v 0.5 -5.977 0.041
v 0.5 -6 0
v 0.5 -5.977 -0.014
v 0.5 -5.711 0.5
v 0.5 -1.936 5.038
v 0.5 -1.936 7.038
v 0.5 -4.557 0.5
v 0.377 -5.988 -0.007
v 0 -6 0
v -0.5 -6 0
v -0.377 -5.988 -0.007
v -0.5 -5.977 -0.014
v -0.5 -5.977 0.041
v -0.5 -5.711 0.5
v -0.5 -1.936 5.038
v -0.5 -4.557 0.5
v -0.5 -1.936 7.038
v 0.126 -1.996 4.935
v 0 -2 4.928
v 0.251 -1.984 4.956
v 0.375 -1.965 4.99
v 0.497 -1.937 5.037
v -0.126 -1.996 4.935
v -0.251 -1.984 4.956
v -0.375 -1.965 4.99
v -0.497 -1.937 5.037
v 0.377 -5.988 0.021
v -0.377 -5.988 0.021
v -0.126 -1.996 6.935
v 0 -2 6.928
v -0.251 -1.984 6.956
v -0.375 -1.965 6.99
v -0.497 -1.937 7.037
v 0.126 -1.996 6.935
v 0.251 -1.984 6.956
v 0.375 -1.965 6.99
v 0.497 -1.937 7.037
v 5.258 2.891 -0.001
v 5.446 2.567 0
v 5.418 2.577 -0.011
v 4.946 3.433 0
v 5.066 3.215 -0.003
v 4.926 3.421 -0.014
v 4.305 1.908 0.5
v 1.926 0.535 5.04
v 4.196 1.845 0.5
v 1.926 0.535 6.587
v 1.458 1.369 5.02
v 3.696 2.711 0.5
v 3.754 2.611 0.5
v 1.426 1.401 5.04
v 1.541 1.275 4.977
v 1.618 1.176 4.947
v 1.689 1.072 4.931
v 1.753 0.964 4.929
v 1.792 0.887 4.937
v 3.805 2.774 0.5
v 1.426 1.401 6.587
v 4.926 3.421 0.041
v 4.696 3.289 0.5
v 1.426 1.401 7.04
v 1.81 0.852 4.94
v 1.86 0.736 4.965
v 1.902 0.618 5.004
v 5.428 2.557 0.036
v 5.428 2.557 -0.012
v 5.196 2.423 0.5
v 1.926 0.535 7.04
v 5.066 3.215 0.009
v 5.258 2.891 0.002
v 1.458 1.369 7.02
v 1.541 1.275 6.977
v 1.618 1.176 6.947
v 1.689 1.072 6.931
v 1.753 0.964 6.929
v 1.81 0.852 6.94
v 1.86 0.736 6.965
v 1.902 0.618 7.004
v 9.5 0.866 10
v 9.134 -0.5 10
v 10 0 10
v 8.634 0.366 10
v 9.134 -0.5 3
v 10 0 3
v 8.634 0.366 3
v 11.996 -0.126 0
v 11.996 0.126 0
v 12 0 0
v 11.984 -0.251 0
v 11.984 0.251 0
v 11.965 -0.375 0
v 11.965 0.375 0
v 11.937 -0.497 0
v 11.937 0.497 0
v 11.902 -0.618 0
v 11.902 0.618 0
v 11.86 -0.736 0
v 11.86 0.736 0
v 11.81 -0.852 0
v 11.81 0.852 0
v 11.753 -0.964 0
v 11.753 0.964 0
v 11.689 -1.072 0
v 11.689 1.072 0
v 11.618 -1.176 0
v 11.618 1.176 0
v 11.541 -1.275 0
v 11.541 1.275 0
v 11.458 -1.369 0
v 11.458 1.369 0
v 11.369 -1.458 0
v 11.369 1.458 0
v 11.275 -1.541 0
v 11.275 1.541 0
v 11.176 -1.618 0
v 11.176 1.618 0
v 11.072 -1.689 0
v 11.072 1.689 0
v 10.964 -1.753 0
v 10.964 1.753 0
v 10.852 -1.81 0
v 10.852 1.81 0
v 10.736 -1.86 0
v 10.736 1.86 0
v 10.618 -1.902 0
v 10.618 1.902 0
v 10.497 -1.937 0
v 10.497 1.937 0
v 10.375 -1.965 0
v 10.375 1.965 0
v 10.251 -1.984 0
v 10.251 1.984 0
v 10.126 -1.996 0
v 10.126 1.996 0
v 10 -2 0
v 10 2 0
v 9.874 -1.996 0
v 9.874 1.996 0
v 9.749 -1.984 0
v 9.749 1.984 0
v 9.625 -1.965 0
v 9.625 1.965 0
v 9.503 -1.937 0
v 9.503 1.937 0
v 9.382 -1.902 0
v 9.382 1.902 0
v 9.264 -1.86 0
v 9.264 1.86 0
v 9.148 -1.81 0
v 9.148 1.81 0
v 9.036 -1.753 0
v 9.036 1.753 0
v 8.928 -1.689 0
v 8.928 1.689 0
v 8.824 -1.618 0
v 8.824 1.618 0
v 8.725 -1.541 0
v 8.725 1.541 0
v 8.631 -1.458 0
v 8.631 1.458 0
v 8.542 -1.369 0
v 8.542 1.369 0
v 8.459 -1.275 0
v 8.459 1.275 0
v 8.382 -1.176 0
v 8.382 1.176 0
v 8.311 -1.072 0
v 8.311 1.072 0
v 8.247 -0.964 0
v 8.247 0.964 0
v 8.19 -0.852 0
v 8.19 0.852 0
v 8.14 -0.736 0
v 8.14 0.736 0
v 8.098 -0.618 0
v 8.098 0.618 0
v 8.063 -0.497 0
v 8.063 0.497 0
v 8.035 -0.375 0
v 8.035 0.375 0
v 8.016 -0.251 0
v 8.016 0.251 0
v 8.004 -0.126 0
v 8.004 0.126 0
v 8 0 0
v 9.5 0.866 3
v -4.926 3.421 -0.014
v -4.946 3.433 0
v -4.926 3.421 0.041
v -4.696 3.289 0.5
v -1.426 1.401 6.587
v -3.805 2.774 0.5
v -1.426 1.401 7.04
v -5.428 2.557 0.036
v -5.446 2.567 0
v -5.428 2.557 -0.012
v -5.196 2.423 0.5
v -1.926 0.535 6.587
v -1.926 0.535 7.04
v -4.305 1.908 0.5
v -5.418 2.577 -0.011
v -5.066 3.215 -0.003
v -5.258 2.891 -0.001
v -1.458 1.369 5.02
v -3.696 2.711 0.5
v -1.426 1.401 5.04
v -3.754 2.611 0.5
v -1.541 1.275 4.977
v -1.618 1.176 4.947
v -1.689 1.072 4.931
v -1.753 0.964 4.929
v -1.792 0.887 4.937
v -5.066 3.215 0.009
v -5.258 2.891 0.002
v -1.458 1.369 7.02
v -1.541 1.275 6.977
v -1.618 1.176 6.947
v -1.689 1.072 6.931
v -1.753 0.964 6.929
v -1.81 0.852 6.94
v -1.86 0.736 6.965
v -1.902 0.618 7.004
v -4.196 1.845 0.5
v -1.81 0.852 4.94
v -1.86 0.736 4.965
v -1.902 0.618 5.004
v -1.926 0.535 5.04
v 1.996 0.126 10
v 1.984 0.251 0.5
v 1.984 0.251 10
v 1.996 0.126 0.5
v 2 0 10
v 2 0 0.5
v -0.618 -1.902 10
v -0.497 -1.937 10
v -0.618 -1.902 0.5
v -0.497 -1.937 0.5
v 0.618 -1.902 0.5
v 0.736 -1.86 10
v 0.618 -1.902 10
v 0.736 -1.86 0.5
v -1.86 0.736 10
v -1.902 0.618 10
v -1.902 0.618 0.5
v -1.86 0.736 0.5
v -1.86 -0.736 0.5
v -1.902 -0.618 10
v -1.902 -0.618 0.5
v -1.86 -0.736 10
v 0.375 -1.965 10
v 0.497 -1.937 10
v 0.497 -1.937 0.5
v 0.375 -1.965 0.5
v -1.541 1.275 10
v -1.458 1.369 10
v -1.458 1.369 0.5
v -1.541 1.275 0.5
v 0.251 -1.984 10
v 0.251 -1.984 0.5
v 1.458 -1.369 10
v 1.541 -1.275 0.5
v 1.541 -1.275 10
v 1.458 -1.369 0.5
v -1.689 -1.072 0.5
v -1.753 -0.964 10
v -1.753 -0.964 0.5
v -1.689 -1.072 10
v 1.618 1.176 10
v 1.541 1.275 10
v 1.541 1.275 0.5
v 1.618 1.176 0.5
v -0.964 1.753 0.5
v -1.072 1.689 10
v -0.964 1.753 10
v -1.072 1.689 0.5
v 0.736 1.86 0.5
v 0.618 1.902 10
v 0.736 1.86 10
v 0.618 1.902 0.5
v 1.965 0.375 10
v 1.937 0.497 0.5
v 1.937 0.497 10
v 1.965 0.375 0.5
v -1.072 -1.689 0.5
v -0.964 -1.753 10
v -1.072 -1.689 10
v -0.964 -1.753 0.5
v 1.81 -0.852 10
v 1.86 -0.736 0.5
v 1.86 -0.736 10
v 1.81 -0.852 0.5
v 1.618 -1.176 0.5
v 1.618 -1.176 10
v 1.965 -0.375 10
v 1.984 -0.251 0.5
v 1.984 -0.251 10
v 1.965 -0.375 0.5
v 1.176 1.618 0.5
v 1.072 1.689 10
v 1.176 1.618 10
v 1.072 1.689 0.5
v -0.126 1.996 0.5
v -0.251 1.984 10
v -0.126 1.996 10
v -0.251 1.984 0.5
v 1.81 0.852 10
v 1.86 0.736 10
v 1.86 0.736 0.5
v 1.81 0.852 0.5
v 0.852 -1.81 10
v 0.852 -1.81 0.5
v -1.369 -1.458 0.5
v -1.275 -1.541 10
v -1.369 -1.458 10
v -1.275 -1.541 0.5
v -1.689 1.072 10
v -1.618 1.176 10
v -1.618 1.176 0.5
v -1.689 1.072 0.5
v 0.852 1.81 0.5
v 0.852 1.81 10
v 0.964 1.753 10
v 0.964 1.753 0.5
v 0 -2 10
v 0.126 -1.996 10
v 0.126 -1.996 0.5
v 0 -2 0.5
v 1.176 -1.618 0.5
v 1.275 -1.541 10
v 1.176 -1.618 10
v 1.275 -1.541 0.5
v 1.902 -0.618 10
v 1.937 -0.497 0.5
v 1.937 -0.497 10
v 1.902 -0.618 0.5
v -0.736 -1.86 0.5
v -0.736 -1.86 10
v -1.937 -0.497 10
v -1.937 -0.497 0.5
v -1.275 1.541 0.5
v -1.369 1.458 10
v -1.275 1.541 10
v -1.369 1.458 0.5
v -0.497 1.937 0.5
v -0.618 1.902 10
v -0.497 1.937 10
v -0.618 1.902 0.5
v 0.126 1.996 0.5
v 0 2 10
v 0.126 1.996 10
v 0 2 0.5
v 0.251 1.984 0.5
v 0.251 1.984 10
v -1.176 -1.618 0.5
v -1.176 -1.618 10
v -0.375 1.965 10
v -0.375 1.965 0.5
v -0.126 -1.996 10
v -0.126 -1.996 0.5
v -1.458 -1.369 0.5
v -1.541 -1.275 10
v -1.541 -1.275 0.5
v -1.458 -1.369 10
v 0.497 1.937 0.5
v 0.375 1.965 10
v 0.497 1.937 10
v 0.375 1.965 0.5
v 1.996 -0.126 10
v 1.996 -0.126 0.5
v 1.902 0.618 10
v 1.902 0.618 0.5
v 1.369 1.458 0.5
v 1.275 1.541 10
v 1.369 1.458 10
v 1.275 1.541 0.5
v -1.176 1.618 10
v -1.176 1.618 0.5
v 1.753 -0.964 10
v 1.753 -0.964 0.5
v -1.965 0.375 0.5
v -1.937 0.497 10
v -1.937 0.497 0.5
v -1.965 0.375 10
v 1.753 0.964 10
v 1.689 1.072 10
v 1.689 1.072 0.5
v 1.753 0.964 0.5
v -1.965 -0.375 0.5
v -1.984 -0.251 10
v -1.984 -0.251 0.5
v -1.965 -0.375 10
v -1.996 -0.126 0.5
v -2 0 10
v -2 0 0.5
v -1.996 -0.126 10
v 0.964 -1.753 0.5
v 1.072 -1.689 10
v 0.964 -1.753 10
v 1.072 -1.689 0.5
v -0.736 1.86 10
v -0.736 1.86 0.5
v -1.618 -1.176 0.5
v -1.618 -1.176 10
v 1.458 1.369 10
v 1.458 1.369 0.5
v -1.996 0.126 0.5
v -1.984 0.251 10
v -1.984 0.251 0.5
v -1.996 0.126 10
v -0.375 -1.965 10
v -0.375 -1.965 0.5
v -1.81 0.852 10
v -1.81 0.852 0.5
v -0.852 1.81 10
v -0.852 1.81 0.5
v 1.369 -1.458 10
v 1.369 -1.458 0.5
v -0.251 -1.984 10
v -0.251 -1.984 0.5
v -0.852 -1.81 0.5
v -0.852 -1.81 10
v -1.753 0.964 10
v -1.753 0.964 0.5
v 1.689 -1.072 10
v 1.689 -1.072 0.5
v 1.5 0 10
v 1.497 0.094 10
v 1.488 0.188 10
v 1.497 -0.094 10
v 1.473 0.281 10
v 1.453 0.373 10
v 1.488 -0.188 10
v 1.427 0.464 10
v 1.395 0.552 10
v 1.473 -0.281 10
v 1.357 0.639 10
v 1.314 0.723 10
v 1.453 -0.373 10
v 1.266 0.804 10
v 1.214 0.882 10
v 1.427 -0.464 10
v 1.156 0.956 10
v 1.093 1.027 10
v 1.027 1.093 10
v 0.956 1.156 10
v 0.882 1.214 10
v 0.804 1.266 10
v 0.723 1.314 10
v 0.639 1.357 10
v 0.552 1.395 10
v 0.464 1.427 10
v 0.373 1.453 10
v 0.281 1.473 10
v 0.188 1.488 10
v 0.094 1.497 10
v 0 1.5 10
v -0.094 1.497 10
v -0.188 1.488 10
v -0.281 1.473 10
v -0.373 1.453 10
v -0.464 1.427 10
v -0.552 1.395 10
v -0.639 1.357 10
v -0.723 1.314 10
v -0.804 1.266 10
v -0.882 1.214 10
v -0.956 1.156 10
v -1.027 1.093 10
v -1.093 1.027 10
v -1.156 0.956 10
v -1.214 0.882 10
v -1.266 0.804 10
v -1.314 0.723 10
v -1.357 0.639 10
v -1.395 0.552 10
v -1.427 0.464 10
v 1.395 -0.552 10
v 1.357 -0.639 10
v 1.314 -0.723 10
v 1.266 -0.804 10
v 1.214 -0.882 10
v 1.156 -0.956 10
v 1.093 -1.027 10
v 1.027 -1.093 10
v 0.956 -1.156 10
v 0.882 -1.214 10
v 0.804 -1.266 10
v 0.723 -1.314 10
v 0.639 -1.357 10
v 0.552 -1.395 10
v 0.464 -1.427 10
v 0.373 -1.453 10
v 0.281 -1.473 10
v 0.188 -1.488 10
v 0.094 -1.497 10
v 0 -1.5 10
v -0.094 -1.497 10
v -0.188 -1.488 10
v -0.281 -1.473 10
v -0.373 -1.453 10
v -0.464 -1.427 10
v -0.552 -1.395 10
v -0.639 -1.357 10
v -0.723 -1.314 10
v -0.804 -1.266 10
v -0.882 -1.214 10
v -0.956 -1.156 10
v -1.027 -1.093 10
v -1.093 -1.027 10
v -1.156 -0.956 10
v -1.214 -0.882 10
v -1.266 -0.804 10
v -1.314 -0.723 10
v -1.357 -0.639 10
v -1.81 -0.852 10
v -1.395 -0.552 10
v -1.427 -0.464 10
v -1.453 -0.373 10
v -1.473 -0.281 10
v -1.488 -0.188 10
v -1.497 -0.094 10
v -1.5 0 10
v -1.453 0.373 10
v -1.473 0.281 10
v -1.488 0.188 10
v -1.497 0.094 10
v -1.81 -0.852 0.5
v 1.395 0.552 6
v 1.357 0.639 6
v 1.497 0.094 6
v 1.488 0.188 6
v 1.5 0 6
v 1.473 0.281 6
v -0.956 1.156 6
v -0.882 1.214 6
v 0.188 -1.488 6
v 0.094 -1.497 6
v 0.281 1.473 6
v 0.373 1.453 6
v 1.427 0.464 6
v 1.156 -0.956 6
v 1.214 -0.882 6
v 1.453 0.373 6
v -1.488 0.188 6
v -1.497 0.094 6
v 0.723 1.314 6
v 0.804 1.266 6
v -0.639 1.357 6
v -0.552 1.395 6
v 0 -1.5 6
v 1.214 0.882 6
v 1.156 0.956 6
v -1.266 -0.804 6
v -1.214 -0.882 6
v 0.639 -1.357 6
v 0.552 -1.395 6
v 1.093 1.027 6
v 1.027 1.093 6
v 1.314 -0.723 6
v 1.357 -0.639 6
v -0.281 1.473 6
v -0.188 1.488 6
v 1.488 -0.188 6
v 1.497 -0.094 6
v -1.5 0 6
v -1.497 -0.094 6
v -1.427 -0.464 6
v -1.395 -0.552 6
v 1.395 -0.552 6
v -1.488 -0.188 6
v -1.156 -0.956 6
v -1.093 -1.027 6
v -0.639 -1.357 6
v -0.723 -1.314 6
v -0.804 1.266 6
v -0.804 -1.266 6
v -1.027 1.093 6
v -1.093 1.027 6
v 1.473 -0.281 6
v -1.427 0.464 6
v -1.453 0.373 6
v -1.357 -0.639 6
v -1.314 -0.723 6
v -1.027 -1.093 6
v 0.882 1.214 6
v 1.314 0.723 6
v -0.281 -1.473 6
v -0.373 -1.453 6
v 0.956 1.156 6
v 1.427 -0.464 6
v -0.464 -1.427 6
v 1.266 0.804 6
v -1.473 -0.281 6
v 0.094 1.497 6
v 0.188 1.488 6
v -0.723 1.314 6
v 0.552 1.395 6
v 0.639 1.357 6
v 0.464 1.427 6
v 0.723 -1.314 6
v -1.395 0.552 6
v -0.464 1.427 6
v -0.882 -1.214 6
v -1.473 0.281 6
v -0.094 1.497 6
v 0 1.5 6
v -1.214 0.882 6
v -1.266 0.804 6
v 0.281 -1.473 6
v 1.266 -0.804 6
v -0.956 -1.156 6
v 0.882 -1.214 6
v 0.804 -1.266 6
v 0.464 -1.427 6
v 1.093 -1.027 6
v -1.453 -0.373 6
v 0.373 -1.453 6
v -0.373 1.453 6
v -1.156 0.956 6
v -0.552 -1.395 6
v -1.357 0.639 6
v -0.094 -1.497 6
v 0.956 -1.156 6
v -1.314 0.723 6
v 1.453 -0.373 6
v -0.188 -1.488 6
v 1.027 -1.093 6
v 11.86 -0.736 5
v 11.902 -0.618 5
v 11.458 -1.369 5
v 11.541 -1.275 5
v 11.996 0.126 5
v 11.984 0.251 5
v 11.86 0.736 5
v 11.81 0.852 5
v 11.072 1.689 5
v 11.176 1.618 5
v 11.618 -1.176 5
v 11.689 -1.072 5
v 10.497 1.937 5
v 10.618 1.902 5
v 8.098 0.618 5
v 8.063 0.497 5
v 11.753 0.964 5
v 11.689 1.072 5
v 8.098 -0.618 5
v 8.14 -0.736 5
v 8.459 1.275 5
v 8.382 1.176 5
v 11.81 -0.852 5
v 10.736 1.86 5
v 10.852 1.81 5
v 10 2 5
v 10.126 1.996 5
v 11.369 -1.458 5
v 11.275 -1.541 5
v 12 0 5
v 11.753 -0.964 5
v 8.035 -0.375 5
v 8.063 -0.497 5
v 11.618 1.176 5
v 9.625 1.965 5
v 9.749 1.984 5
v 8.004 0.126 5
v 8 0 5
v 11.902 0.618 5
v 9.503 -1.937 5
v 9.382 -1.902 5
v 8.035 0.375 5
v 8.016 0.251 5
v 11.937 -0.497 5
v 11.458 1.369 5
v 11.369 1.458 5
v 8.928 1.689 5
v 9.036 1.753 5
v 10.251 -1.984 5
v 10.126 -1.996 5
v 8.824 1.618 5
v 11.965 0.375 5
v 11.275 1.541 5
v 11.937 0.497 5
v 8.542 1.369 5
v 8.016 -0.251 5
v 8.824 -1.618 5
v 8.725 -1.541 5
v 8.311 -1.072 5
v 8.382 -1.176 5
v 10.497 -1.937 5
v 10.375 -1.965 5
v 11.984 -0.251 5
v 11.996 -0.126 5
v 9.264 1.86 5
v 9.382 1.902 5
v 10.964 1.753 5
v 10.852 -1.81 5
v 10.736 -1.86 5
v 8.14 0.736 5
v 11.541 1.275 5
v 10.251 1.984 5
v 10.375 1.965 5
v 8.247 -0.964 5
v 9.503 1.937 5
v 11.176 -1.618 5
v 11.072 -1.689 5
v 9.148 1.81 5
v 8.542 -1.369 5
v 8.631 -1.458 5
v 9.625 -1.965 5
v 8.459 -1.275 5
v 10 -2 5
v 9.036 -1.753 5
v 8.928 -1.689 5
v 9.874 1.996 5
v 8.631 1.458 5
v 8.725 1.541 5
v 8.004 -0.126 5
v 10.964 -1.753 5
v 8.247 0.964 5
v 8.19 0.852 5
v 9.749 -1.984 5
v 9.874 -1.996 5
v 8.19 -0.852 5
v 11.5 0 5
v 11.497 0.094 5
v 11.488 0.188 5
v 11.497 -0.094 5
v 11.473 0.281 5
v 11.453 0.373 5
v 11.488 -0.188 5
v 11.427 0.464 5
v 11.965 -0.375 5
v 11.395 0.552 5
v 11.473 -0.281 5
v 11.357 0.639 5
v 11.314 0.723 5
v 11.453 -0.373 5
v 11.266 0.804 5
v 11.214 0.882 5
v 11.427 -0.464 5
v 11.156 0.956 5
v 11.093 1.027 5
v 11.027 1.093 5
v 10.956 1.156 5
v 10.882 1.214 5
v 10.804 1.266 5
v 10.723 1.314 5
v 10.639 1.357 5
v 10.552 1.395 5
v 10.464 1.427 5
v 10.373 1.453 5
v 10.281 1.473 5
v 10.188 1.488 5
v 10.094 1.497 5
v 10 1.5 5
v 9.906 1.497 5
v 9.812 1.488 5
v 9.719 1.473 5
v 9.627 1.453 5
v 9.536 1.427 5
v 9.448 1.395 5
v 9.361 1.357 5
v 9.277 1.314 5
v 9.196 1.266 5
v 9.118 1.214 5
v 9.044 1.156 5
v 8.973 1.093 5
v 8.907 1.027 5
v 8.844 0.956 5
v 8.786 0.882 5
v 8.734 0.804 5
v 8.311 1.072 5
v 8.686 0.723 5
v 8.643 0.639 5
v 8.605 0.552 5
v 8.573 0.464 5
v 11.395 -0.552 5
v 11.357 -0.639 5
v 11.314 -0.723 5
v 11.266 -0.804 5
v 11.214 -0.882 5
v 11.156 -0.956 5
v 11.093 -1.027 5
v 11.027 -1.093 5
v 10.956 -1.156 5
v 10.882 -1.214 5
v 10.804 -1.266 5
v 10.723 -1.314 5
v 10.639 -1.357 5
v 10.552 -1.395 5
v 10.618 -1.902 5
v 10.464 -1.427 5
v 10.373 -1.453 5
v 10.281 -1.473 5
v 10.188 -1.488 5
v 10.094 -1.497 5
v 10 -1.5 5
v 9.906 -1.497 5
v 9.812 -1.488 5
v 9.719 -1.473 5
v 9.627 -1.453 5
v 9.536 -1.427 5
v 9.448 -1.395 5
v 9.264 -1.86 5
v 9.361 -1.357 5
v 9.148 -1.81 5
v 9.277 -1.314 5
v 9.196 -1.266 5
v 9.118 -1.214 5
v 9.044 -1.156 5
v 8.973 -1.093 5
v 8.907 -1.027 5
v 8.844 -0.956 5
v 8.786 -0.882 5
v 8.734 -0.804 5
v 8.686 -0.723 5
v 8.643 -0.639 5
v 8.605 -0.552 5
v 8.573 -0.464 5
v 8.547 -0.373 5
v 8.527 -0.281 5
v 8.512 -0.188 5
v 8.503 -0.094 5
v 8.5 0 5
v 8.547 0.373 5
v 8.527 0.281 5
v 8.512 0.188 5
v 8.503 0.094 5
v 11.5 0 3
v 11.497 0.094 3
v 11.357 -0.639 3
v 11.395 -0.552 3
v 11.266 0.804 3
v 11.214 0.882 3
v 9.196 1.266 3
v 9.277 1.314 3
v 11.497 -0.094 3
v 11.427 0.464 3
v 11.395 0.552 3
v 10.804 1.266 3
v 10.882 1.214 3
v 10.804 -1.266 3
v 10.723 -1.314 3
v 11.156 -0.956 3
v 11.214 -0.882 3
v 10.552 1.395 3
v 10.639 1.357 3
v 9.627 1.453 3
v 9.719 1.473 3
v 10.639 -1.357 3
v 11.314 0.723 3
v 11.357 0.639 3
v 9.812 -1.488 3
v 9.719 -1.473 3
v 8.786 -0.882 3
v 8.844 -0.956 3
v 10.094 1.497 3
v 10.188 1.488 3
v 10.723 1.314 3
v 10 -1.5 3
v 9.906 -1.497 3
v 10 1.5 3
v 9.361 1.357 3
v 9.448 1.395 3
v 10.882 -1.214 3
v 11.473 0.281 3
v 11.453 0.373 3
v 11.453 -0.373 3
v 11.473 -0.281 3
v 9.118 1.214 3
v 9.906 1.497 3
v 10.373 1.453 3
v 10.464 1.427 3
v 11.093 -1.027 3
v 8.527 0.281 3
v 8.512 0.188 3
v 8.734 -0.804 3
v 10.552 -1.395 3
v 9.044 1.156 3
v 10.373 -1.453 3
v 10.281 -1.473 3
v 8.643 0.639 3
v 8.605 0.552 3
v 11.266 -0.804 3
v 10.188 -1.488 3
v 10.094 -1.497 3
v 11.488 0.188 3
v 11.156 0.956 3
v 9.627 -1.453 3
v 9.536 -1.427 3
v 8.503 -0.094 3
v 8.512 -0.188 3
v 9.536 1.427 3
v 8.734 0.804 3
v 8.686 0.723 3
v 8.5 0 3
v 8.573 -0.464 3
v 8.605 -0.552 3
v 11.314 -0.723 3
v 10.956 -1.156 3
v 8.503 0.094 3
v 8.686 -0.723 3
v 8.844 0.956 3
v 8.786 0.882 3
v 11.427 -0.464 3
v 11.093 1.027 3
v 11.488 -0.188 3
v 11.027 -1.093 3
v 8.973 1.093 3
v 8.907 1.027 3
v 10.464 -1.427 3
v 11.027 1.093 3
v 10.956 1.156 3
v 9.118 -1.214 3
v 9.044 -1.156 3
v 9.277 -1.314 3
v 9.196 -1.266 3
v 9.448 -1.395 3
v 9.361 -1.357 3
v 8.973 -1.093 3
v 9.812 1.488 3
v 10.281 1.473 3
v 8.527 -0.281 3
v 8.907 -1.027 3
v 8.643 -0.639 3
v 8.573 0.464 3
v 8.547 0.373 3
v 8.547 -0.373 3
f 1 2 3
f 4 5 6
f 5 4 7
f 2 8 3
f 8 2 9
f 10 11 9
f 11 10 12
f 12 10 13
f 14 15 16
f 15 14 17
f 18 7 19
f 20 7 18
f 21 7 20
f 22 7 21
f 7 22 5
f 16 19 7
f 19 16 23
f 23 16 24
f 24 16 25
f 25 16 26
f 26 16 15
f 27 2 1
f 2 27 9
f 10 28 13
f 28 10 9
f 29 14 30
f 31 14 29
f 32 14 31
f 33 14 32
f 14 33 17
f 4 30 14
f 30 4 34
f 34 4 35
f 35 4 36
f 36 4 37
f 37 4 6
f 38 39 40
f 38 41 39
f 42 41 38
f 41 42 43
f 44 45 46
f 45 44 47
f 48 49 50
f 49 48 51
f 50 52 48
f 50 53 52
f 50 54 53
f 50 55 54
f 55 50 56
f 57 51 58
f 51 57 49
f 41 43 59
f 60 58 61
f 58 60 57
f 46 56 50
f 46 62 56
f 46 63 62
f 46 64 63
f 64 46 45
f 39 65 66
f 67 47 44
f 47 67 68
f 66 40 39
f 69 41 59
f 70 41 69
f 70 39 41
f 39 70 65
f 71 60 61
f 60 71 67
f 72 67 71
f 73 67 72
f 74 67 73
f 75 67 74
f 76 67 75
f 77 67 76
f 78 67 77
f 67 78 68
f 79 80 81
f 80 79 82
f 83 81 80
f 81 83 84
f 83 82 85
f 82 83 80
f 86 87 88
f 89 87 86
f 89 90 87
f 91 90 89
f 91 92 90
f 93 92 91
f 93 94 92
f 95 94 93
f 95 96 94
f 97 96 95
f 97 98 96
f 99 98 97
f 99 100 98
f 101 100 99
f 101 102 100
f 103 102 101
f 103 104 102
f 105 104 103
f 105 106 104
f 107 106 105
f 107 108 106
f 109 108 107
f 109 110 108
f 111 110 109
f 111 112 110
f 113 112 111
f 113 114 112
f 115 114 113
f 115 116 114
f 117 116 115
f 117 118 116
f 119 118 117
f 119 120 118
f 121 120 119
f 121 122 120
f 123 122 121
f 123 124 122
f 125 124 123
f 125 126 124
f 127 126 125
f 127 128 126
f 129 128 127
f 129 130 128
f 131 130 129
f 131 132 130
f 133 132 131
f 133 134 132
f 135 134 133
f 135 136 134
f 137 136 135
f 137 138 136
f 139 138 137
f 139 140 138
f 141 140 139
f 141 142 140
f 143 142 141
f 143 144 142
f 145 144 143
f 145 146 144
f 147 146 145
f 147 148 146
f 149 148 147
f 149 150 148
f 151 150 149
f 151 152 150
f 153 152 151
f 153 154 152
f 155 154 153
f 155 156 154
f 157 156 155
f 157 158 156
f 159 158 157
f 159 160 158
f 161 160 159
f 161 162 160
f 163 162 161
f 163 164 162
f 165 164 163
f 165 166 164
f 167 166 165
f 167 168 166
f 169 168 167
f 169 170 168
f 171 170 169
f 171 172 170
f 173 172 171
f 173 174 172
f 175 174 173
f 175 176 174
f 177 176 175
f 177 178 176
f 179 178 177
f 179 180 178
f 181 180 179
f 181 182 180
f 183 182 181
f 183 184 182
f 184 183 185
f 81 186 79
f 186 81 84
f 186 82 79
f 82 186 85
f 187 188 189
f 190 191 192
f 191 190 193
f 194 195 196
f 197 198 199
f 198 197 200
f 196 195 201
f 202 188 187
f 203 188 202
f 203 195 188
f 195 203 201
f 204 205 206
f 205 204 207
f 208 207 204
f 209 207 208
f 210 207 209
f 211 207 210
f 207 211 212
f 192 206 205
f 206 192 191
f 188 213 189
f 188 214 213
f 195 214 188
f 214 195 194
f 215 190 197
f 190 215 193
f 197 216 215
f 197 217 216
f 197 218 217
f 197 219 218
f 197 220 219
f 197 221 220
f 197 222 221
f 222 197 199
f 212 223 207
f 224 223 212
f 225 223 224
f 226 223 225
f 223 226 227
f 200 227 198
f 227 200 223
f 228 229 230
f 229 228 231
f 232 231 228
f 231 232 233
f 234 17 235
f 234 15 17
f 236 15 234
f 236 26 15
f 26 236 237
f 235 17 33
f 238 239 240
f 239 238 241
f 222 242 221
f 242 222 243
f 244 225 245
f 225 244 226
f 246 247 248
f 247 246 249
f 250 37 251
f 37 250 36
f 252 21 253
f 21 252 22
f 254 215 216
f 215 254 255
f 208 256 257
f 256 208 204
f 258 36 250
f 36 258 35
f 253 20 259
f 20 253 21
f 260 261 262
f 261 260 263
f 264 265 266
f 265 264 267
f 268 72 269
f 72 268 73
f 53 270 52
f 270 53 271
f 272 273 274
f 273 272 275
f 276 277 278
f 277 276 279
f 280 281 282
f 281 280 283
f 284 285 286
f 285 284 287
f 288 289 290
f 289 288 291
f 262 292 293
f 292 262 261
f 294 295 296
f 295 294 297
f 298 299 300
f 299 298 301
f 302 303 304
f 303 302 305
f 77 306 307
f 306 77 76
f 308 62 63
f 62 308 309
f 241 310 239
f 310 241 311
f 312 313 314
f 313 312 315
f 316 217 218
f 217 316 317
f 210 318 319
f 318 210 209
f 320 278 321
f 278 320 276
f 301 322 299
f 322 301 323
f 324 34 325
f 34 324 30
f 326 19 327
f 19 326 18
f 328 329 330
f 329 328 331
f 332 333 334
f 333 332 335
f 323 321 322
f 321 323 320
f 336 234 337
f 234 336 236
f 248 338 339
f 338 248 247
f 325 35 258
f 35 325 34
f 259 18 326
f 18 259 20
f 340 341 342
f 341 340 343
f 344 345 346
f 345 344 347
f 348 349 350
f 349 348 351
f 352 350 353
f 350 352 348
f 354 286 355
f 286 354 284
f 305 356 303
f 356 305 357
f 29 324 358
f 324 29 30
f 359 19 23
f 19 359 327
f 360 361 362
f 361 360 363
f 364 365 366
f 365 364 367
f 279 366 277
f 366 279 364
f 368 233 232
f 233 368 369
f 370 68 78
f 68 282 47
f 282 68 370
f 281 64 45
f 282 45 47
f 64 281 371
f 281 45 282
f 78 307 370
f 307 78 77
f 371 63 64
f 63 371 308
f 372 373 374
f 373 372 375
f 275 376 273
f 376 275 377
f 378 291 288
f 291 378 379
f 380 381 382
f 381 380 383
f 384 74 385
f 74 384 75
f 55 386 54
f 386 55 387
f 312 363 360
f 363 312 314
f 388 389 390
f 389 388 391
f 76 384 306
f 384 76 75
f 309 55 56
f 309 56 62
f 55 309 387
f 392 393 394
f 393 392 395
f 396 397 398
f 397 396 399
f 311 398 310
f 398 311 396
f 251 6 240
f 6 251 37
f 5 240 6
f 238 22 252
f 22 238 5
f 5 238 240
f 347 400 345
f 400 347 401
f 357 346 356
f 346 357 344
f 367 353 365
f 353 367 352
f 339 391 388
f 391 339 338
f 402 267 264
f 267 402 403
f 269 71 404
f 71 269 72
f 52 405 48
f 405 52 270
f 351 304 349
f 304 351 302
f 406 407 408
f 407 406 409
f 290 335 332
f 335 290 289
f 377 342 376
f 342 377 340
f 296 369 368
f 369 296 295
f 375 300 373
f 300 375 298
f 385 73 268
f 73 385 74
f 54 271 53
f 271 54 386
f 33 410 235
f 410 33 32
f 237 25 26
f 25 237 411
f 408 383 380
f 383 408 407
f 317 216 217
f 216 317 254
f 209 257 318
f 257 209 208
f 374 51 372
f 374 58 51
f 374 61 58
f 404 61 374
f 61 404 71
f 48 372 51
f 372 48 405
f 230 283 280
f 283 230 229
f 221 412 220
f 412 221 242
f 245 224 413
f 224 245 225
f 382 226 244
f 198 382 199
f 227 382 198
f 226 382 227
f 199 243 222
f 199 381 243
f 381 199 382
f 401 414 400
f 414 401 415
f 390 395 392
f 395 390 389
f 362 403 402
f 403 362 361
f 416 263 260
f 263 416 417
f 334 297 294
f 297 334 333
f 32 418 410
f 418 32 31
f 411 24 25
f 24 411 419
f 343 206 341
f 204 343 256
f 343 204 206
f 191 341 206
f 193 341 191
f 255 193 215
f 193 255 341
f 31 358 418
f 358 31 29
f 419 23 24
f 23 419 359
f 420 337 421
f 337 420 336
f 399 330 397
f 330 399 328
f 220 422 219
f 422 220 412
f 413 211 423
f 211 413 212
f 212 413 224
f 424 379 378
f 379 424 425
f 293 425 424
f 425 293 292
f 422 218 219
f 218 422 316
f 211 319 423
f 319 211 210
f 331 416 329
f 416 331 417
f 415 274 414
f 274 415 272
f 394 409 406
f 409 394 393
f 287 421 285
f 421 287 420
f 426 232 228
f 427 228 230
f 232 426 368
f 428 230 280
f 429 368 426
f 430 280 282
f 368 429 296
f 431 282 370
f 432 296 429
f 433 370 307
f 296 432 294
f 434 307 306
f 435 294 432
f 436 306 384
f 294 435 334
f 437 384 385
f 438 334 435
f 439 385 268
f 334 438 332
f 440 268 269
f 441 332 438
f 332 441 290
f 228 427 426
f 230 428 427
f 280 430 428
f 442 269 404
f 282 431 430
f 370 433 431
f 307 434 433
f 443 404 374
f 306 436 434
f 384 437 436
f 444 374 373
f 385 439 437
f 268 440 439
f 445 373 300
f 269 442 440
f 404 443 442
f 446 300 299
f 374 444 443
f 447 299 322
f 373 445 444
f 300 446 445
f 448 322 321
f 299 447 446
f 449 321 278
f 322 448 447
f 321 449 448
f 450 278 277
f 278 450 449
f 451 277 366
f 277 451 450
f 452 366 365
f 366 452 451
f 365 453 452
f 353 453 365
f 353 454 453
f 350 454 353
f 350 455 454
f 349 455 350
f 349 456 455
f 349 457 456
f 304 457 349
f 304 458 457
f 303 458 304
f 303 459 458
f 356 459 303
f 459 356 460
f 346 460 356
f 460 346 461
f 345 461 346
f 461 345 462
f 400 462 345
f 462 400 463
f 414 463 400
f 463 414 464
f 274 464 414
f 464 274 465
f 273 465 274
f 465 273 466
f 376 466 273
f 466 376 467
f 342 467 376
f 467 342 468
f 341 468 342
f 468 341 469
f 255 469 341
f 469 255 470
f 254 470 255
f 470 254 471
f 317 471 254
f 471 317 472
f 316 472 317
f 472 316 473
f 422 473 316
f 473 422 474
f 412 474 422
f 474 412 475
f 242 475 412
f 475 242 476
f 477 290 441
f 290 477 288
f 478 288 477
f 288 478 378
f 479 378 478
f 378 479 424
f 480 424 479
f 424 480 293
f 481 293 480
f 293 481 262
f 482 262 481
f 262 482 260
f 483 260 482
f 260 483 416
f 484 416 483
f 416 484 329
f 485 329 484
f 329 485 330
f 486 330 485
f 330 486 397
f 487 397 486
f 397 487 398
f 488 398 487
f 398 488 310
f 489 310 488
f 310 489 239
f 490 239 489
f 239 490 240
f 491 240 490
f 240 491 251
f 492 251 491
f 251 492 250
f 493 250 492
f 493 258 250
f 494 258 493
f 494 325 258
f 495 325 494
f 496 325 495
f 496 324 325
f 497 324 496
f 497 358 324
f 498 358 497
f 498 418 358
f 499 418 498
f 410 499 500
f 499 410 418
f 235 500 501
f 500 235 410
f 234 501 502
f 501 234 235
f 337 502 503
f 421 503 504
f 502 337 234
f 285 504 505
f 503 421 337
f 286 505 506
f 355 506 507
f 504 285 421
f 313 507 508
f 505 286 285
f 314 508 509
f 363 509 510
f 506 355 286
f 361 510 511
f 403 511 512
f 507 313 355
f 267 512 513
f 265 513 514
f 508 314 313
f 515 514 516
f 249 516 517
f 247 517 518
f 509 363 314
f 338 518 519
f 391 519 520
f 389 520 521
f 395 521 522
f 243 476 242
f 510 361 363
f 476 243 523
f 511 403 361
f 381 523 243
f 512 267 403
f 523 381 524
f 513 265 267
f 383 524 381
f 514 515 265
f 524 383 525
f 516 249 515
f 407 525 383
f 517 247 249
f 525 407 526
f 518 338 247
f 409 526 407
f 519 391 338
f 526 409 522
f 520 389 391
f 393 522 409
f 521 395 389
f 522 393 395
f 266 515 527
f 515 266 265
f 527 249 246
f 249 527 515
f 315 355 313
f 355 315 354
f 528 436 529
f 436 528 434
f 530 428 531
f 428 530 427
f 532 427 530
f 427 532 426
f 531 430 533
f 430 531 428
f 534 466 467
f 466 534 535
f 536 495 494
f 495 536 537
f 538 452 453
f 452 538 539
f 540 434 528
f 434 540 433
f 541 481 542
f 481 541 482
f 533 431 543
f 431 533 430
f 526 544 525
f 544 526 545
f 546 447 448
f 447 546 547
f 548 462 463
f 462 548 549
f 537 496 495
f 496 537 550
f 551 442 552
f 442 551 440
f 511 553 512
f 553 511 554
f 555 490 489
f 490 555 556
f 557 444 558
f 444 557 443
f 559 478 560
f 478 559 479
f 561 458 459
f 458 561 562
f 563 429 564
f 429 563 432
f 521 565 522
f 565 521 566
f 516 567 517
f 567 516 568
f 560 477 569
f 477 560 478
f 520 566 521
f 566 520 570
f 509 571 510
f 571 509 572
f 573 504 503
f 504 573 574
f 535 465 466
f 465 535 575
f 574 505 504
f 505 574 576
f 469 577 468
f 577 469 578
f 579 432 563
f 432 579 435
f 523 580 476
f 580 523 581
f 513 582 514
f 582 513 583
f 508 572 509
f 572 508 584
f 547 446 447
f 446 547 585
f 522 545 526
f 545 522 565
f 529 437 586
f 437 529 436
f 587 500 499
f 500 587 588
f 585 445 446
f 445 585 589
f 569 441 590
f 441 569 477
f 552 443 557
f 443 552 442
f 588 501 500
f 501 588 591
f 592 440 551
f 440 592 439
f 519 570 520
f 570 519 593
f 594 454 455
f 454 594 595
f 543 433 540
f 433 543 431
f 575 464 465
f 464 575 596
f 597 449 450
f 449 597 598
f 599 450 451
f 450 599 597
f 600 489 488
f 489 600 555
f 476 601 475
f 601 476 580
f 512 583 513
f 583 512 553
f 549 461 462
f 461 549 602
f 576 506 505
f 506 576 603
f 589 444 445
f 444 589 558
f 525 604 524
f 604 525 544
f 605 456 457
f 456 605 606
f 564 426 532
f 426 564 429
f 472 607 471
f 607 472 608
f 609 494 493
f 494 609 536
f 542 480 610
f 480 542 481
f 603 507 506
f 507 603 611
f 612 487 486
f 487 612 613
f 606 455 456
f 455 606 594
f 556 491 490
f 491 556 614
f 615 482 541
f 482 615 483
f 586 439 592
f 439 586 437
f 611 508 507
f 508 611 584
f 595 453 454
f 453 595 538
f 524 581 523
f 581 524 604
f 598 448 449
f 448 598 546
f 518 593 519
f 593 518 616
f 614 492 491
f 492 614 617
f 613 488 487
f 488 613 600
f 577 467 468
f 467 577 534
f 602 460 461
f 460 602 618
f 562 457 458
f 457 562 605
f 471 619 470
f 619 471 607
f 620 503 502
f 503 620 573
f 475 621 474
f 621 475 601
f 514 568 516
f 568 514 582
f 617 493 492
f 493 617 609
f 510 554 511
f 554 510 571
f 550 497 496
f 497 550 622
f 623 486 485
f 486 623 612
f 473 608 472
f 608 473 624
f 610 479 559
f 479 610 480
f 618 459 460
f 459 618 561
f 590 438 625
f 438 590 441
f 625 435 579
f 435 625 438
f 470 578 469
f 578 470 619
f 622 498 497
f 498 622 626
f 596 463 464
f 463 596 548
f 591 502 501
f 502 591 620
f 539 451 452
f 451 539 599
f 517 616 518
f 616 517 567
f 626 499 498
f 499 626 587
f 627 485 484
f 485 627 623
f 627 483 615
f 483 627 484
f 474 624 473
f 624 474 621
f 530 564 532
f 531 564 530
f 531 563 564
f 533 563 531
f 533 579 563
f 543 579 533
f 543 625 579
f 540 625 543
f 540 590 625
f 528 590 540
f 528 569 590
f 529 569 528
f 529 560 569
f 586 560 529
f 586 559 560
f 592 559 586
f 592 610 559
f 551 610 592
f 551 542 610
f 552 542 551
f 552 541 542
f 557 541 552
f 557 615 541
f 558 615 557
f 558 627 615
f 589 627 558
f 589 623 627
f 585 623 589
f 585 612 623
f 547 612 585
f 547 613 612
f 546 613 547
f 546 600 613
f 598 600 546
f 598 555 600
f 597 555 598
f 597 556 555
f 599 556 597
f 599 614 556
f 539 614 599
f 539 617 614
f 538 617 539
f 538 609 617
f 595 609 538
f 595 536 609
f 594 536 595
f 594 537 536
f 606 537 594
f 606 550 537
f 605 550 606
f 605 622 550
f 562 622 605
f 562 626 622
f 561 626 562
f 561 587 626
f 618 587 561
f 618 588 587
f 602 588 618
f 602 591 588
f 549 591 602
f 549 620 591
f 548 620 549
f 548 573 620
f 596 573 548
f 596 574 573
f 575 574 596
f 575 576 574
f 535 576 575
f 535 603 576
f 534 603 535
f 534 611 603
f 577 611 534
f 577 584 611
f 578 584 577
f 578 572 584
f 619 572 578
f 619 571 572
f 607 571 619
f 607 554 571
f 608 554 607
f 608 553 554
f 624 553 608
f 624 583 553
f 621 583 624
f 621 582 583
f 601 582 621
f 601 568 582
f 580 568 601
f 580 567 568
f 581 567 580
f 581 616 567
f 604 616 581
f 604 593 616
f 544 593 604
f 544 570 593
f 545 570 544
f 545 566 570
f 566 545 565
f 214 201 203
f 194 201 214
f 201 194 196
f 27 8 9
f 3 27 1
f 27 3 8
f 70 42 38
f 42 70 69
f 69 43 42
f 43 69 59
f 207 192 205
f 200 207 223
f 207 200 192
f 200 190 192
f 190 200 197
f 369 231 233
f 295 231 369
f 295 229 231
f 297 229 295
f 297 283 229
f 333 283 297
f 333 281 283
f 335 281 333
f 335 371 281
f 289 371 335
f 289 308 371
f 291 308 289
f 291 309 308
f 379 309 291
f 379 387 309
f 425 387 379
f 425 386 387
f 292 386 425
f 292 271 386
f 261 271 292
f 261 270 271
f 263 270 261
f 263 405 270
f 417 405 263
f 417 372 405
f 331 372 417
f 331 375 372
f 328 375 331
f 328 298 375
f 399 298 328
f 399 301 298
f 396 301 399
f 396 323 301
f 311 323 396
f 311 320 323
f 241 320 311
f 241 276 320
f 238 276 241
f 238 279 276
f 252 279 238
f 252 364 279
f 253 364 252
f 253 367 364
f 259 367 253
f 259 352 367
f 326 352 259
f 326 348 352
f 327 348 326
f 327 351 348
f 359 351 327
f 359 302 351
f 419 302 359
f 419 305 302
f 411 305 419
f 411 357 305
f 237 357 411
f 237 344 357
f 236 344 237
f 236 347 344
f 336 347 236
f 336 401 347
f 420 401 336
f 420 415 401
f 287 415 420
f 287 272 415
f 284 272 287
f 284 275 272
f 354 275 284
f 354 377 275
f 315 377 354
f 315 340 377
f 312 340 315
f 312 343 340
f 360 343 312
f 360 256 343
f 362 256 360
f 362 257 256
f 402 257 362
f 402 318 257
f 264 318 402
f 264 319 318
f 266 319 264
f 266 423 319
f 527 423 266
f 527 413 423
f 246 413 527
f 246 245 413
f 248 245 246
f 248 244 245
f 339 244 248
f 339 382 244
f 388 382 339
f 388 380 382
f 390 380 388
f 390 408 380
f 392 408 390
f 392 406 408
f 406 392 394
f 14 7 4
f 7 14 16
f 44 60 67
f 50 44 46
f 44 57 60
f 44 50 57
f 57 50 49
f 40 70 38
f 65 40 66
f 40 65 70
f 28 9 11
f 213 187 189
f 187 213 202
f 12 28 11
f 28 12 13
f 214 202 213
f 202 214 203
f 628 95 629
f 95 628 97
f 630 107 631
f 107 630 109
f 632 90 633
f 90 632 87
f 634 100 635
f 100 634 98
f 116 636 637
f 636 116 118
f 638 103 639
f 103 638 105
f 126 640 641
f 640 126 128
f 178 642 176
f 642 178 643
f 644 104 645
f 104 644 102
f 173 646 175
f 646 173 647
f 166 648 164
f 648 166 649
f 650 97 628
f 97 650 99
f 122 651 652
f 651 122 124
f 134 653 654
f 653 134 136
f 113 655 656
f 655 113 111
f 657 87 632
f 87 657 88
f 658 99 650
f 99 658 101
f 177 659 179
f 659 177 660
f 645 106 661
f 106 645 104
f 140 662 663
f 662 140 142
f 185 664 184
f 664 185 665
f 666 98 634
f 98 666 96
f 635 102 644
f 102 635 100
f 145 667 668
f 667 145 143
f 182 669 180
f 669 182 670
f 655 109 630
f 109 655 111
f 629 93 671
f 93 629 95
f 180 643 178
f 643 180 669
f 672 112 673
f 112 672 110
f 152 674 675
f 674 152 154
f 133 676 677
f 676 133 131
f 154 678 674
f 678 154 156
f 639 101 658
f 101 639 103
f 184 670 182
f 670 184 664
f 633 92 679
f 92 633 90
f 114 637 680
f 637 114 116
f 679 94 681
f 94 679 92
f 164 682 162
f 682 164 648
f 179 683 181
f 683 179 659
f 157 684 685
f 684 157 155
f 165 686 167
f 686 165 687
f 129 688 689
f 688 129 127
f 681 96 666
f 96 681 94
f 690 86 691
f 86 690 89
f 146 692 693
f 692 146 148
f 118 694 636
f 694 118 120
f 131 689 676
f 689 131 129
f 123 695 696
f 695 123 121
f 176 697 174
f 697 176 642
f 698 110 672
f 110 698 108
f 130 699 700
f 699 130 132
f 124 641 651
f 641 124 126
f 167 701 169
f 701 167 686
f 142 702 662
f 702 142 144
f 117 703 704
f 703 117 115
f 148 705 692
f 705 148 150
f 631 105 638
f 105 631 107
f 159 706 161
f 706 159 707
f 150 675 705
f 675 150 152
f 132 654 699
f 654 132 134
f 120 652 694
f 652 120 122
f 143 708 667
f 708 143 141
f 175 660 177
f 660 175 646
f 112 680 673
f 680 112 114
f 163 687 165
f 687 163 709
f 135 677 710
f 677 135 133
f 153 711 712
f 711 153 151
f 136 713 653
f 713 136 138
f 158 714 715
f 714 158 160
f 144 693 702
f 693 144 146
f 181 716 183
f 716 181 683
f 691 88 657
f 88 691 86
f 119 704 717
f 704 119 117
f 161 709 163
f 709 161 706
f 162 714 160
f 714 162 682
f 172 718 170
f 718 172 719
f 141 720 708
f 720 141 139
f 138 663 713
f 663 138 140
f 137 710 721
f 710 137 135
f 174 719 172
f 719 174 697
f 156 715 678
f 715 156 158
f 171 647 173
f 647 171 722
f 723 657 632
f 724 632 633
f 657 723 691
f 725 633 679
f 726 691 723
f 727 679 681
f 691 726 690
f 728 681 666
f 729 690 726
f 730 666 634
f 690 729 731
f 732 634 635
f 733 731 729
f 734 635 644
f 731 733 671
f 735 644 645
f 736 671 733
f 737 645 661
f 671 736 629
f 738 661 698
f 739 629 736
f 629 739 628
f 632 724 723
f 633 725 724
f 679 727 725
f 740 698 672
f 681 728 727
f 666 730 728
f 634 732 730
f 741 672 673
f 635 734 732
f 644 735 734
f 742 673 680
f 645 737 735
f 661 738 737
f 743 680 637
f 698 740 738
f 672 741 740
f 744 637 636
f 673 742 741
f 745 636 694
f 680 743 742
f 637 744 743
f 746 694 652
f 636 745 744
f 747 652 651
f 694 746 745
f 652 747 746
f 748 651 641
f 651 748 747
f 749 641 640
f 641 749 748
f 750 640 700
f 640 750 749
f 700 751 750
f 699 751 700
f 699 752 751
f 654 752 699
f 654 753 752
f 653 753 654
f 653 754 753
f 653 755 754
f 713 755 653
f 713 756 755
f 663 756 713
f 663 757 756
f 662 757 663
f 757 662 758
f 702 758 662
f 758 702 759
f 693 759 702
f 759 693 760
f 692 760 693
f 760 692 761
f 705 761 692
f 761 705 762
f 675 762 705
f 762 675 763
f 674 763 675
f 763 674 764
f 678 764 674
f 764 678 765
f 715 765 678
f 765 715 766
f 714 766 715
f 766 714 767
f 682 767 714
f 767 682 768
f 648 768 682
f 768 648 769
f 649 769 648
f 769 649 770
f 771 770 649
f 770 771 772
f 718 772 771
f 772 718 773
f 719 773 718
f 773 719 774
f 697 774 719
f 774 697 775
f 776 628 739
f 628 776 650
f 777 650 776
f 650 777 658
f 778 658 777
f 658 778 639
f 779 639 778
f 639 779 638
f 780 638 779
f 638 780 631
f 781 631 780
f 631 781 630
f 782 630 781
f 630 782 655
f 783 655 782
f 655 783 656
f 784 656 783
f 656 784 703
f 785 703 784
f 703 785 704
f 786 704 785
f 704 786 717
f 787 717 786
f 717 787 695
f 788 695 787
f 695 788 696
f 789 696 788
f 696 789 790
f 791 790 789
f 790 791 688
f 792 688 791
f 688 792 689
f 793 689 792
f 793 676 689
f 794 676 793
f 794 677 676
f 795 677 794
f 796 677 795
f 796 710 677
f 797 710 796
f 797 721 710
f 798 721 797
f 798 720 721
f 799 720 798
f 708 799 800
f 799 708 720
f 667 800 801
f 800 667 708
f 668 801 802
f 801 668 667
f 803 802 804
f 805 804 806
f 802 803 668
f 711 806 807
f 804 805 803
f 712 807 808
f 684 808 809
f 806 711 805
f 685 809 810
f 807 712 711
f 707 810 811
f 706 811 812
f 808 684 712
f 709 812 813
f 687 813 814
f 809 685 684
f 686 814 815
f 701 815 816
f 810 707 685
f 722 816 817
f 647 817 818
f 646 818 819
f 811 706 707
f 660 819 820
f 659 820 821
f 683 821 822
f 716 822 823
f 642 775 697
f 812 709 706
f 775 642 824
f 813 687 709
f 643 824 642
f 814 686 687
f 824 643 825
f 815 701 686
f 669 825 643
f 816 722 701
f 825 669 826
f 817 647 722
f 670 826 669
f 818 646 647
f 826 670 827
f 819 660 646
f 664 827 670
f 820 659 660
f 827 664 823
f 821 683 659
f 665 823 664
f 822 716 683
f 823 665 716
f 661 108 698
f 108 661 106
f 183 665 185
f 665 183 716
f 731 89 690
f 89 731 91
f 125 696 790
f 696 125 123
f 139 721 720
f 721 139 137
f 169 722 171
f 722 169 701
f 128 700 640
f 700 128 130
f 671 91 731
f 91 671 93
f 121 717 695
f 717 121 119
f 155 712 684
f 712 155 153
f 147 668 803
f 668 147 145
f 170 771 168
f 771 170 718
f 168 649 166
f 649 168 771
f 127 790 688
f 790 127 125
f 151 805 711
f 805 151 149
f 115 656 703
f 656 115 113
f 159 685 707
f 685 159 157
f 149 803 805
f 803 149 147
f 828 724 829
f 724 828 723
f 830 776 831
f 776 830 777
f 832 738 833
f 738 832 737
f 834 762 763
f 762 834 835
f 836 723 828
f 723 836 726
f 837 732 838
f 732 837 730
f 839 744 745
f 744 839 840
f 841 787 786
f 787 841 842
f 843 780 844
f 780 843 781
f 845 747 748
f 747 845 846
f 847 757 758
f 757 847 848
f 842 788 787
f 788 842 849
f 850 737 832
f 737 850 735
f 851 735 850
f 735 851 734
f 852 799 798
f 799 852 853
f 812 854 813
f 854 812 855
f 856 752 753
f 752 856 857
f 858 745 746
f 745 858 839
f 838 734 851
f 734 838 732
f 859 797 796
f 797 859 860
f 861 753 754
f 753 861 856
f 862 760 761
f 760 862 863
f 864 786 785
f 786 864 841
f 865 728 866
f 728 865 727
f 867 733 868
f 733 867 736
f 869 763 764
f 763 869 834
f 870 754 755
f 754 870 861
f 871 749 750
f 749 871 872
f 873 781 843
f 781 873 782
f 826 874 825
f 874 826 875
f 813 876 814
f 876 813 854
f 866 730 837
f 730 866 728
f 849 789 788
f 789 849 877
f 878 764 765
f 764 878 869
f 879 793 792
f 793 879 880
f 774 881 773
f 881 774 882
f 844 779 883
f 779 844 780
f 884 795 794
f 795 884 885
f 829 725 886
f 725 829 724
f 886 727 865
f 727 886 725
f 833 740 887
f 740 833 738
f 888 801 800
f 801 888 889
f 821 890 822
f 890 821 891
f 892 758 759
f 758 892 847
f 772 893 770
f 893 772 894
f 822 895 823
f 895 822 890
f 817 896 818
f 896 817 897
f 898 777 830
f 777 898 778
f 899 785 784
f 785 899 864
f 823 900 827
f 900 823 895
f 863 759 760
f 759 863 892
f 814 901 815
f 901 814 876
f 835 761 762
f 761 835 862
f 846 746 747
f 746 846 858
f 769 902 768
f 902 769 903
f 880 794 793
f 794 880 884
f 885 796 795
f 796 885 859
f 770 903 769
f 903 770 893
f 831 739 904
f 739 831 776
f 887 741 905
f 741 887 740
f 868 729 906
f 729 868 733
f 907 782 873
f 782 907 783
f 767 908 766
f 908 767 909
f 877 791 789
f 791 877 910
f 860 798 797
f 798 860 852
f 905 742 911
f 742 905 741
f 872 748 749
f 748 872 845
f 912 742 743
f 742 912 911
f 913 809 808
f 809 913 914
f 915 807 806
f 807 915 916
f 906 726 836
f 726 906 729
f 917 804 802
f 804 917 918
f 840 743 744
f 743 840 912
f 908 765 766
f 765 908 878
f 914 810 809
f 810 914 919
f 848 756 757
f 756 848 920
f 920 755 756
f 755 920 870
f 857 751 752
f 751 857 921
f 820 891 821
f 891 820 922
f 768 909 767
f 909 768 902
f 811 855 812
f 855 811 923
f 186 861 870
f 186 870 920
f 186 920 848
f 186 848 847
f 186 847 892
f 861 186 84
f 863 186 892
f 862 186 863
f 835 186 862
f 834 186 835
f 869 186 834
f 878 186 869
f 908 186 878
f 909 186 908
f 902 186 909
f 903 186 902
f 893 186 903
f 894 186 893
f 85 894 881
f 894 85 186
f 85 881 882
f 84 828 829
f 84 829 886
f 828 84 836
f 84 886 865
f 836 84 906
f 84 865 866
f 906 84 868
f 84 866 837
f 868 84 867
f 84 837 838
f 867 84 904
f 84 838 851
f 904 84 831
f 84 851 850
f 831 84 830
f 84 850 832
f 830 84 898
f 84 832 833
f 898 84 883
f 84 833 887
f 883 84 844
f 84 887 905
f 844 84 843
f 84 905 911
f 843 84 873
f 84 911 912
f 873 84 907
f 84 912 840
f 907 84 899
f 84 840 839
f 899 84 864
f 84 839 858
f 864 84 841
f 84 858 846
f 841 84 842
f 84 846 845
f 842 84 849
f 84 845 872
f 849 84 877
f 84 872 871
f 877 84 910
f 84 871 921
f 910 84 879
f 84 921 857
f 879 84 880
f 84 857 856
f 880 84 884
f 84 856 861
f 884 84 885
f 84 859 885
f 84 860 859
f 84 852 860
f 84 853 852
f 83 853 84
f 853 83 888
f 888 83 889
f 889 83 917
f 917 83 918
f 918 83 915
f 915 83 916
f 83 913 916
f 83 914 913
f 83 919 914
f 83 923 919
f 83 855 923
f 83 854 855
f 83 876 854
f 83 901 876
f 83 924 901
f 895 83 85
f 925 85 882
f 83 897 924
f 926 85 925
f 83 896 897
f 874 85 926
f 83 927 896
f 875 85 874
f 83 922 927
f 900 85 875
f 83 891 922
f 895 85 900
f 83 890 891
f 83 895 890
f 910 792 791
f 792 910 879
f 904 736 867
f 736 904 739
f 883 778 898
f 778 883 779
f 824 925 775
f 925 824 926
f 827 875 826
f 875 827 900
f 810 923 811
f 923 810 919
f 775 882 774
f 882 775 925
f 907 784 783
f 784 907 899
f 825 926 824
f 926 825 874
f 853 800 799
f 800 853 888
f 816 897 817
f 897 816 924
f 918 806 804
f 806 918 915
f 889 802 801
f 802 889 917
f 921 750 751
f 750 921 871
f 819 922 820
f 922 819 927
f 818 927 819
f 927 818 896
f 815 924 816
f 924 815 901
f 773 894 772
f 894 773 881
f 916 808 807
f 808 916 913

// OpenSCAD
$fn = 100; 
   
strength = 0.2;
radius_bottom = 10;
radius_top = 2;

module leg()
{
  translate([-0.5,-6,0])
    rotate([-30,0,0])
        cube([1,1,10]);
}

module sensor_holder()
{
  difference()
  {
    tripod();   
    
    translate([0,0,6])
      cylinder(h=5,r=1.5);
  } 
}

module tripod()
{
  leg();
    
  rotate([0,0,120])
    leg();
  
  translate([10,0,0])
  rotate([0,0,120])
  
    cube([1,1,10]);
    
  rotate([0,0,240])
    leg();
    
  translate([0,0,0])
      cylinder(h=10,r=2);
}

module head()
{  
  difference()
  {
    translate([0,0,0])
      cylinder(h=5,r=2);
    
    translate([0,0,3])
      cylinder(h=2.5,r=1.5);
  }
}


difference()
{
  
  
  sensor_holder();
  
  translate([0,0,-0.5])
    cylinder(h=1,r=6);
}

translate([10,0,0])
  head();
